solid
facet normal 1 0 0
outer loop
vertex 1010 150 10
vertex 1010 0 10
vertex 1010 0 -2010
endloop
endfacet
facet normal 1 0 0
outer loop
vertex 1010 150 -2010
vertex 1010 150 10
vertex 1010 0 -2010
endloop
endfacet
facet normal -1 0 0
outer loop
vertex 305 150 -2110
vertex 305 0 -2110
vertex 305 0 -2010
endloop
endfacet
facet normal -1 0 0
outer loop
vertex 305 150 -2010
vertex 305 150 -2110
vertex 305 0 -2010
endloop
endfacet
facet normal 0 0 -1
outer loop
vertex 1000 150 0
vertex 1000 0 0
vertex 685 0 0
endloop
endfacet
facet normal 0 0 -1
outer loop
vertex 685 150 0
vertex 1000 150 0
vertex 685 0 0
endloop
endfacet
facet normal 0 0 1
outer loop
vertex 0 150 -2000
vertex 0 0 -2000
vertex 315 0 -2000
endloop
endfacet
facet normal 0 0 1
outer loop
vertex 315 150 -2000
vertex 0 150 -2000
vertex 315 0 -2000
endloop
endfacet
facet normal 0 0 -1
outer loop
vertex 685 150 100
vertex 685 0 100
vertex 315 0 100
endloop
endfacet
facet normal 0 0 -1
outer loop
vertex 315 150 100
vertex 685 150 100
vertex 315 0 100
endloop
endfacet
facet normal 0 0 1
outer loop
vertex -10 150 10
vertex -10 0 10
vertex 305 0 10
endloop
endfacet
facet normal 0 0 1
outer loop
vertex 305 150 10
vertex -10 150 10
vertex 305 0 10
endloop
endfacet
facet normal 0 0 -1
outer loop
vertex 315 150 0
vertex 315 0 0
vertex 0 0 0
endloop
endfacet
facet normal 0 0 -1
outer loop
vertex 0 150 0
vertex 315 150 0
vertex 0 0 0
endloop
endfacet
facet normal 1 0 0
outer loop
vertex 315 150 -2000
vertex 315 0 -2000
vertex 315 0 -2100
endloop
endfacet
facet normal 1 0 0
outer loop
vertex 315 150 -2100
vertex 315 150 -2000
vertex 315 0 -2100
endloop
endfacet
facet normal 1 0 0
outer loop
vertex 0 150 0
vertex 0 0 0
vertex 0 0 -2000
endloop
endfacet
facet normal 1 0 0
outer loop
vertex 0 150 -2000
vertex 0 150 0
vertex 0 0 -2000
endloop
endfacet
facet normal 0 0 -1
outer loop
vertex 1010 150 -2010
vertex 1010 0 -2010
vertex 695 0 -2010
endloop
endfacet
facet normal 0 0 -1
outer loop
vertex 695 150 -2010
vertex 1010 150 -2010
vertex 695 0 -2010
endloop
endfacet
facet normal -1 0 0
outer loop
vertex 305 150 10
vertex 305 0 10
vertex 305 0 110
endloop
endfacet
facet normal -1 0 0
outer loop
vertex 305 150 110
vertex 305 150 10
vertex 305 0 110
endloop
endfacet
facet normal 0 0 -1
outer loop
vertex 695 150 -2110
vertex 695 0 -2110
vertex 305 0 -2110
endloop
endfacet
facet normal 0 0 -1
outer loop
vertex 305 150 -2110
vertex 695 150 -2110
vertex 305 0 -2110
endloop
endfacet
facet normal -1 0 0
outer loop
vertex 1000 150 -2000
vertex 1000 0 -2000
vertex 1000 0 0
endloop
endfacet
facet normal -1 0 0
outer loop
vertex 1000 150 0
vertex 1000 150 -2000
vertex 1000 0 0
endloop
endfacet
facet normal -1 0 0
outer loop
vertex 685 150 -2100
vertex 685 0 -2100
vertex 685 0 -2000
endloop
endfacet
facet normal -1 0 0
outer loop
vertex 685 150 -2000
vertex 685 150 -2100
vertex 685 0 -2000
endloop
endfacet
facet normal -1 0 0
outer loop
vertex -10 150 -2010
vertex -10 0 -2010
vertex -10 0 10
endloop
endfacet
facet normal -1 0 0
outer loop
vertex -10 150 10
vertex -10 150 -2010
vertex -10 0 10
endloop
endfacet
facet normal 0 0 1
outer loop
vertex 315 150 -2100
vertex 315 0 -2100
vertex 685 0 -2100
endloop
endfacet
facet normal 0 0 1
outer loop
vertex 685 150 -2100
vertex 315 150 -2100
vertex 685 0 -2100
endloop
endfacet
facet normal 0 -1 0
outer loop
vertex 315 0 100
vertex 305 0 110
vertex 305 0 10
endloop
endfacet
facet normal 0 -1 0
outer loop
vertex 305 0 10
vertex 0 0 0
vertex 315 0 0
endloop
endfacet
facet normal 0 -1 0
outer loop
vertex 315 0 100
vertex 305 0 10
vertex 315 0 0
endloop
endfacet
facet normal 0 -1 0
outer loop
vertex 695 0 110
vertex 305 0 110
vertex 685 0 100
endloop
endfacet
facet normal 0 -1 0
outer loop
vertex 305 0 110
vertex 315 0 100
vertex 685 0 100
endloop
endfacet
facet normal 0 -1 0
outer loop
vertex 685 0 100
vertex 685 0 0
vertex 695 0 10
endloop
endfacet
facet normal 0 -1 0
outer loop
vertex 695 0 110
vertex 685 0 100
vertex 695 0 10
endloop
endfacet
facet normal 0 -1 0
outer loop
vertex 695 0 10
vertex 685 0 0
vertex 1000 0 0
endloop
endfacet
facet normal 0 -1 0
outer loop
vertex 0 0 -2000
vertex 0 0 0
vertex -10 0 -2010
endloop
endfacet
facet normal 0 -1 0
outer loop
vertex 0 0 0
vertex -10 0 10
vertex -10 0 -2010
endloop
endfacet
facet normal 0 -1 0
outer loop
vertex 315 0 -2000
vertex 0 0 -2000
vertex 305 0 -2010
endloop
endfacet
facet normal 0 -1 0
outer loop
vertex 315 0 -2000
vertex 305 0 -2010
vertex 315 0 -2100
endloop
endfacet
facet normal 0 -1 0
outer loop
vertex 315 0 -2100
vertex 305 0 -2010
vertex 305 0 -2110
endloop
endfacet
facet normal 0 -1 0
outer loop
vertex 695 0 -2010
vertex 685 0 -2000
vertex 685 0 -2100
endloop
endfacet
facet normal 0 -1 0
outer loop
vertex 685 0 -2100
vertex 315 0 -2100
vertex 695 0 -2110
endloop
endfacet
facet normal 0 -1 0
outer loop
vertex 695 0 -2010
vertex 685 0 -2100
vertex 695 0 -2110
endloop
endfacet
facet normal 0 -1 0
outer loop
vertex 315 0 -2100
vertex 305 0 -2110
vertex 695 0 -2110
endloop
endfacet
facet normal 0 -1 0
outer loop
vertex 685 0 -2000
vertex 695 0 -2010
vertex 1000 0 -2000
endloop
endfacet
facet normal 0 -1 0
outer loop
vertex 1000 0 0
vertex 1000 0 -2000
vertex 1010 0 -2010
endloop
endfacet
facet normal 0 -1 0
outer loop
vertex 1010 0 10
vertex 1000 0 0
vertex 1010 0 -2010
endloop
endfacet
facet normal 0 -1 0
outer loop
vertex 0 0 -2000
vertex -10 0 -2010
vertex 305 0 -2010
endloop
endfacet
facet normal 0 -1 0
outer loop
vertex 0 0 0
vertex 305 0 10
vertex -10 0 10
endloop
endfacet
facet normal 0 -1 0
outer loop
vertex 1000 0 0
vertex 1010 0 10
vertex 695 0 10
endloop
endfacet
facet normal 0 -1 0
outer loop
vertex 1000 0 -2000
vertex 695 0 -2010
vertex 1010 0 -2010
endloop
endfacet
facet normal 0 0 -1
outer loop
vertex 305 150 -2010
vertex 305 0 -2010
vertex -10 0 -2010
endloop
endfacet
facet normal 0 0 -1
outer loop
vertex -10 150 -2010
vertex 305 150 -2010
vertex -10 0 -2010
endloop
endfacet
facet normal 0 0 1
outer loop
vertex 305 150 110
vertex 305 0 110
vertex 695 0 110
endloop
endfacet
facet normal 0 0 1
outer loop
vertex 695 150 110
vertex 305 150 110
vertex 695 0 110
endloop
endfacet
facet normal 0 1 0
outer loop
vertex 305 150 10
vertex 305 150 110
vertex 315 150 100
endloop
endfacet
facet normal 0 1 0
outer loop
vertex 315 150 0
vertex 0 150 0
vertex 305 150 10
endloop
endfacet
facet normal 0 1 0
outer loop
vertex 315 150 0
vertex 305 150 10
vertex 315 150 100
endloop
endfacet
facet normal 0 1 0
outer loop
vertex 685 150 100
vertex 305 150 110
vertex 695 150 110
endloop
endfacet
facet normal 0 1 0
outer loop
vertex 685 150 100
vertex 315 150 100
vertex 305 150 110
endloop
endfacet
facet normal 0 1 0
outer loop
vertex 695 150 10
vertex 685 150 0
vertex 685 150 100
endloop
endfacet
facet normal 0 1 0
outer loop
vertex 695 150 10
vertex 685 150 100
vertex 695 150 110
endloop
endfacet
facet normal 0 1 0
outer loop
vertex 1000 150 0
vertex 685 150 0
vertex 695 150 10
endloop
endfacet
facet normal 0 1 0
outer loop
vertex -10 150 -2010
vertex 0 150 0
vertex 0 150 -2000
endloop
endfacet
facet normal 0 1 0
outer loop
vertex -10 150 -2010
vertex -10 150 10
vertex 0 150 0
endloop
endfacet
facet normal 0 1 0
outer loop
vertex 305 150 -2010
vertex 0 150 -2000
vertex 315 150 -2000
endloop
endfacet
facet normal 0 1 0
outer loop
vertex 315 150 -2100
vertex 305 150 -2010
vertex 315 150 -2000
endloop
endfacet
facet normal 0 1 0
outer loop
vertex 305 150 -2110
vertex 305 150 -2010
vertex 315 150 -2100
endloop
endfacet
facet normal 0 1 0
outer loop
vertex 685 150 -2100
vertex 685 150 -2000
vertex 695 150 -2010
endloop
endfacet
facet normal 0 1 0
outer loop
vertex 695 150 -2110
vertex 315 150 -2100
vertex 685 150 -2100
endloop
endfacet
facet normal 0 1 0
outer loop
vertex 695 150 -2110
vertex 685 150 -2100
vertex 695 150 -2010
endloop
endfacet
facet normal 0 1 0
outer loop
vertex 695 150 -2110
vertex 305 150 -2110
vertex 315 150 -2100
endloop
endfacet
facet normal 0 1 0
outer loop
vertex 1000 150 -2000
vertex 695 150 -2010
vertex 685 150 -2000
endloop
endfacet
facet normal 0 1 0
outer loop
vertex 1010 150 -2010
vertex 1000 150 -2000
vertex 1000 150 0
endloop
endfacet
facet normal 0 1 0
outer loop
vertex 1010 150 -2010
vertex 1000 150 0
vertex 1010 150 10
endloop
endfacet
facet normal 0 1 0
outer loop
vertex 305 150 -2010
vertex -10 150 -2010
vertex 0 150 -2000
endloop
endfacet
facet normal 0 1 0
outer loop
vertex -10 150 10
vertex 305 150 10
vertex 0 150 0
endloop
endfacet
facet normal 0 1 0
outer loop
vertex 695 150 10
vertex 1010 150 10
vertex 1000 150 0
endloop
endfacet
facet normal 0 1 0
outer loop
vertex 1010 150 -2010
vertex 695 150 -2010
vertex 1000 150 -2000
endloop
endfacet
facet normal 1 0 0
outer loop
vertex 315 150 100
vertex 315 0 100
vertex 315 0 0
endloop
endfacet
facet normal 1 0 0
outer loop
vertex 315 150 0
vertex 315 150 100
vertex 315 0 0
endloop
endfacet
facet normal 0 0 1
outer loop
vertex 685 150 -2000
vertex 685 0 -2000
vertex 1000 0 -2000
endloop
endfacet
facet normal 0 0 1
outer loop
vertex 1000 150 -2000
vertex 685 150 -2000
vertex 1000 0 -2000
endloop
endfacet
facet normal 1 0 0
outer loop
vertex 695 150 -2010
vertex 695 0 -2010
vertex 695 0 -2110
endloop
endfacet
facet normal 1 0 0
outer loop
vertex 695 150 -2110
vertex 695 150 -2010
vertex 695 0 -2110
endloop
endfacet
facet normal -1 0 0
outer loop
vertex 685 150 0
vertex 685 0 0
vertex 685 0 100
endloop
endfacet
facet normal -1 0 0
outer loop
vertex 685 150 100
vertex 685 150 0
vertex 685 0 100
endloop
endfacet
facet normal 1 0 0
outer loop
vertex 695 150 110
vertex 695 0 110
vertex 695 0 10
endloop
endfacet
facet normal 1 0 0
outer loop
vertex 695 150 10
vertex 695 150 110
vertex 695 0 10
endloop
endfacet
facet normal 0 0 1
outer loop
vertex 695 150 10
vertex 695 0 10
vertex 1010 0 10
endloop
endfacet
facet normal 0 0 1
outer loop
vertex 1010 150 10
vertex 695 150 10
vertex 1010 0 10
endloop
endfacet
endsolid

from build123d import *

# Parameters (mm, degrees)
BOSS_EXTRUDE1_DEPTH = 150


with BuildPart() as part:
    # Sketch2 → Boss-Extrude1 (new body)
    with BuildSketch(Plane(origin=(0, 0, 0), x_dir=(1, 0, 0), z_dir=(0, 1, 0))):
        Polygon((315, -100), (315, -10), (305, -10), (305, -110), (695, -110), (695, -10), (685, -10), (685, -100), align=None)
        Polygon((305, 0), (0, 0), (0, 990), (0, 1010), (0, 2000), (305, 2000), (315, 2000), (315, 2010), (305, 2010), (-10, 2010), (-10, -10), (305, -10), (315, -10), (315, 0), align=None)
        Polygon((1000, 1010), (1000, 990), (1000, 0), (695, 0), (685, 0), (685, -10), (695, -10), (1010, -10), (1010, 2010), (695, 2010), (685, 2010), (685, 2000), (695, 2000), (1000, 2000), align=None)
        Polygon((305, 2010), (315, 2010), (315, 2100), (685, 2100), (685, 2010), (695, 2010), (695, 2110), (305, 2110), align=None)
    extrude(amount=BOSS_EXTRUDE1_DEPTH)


solid = part.part
